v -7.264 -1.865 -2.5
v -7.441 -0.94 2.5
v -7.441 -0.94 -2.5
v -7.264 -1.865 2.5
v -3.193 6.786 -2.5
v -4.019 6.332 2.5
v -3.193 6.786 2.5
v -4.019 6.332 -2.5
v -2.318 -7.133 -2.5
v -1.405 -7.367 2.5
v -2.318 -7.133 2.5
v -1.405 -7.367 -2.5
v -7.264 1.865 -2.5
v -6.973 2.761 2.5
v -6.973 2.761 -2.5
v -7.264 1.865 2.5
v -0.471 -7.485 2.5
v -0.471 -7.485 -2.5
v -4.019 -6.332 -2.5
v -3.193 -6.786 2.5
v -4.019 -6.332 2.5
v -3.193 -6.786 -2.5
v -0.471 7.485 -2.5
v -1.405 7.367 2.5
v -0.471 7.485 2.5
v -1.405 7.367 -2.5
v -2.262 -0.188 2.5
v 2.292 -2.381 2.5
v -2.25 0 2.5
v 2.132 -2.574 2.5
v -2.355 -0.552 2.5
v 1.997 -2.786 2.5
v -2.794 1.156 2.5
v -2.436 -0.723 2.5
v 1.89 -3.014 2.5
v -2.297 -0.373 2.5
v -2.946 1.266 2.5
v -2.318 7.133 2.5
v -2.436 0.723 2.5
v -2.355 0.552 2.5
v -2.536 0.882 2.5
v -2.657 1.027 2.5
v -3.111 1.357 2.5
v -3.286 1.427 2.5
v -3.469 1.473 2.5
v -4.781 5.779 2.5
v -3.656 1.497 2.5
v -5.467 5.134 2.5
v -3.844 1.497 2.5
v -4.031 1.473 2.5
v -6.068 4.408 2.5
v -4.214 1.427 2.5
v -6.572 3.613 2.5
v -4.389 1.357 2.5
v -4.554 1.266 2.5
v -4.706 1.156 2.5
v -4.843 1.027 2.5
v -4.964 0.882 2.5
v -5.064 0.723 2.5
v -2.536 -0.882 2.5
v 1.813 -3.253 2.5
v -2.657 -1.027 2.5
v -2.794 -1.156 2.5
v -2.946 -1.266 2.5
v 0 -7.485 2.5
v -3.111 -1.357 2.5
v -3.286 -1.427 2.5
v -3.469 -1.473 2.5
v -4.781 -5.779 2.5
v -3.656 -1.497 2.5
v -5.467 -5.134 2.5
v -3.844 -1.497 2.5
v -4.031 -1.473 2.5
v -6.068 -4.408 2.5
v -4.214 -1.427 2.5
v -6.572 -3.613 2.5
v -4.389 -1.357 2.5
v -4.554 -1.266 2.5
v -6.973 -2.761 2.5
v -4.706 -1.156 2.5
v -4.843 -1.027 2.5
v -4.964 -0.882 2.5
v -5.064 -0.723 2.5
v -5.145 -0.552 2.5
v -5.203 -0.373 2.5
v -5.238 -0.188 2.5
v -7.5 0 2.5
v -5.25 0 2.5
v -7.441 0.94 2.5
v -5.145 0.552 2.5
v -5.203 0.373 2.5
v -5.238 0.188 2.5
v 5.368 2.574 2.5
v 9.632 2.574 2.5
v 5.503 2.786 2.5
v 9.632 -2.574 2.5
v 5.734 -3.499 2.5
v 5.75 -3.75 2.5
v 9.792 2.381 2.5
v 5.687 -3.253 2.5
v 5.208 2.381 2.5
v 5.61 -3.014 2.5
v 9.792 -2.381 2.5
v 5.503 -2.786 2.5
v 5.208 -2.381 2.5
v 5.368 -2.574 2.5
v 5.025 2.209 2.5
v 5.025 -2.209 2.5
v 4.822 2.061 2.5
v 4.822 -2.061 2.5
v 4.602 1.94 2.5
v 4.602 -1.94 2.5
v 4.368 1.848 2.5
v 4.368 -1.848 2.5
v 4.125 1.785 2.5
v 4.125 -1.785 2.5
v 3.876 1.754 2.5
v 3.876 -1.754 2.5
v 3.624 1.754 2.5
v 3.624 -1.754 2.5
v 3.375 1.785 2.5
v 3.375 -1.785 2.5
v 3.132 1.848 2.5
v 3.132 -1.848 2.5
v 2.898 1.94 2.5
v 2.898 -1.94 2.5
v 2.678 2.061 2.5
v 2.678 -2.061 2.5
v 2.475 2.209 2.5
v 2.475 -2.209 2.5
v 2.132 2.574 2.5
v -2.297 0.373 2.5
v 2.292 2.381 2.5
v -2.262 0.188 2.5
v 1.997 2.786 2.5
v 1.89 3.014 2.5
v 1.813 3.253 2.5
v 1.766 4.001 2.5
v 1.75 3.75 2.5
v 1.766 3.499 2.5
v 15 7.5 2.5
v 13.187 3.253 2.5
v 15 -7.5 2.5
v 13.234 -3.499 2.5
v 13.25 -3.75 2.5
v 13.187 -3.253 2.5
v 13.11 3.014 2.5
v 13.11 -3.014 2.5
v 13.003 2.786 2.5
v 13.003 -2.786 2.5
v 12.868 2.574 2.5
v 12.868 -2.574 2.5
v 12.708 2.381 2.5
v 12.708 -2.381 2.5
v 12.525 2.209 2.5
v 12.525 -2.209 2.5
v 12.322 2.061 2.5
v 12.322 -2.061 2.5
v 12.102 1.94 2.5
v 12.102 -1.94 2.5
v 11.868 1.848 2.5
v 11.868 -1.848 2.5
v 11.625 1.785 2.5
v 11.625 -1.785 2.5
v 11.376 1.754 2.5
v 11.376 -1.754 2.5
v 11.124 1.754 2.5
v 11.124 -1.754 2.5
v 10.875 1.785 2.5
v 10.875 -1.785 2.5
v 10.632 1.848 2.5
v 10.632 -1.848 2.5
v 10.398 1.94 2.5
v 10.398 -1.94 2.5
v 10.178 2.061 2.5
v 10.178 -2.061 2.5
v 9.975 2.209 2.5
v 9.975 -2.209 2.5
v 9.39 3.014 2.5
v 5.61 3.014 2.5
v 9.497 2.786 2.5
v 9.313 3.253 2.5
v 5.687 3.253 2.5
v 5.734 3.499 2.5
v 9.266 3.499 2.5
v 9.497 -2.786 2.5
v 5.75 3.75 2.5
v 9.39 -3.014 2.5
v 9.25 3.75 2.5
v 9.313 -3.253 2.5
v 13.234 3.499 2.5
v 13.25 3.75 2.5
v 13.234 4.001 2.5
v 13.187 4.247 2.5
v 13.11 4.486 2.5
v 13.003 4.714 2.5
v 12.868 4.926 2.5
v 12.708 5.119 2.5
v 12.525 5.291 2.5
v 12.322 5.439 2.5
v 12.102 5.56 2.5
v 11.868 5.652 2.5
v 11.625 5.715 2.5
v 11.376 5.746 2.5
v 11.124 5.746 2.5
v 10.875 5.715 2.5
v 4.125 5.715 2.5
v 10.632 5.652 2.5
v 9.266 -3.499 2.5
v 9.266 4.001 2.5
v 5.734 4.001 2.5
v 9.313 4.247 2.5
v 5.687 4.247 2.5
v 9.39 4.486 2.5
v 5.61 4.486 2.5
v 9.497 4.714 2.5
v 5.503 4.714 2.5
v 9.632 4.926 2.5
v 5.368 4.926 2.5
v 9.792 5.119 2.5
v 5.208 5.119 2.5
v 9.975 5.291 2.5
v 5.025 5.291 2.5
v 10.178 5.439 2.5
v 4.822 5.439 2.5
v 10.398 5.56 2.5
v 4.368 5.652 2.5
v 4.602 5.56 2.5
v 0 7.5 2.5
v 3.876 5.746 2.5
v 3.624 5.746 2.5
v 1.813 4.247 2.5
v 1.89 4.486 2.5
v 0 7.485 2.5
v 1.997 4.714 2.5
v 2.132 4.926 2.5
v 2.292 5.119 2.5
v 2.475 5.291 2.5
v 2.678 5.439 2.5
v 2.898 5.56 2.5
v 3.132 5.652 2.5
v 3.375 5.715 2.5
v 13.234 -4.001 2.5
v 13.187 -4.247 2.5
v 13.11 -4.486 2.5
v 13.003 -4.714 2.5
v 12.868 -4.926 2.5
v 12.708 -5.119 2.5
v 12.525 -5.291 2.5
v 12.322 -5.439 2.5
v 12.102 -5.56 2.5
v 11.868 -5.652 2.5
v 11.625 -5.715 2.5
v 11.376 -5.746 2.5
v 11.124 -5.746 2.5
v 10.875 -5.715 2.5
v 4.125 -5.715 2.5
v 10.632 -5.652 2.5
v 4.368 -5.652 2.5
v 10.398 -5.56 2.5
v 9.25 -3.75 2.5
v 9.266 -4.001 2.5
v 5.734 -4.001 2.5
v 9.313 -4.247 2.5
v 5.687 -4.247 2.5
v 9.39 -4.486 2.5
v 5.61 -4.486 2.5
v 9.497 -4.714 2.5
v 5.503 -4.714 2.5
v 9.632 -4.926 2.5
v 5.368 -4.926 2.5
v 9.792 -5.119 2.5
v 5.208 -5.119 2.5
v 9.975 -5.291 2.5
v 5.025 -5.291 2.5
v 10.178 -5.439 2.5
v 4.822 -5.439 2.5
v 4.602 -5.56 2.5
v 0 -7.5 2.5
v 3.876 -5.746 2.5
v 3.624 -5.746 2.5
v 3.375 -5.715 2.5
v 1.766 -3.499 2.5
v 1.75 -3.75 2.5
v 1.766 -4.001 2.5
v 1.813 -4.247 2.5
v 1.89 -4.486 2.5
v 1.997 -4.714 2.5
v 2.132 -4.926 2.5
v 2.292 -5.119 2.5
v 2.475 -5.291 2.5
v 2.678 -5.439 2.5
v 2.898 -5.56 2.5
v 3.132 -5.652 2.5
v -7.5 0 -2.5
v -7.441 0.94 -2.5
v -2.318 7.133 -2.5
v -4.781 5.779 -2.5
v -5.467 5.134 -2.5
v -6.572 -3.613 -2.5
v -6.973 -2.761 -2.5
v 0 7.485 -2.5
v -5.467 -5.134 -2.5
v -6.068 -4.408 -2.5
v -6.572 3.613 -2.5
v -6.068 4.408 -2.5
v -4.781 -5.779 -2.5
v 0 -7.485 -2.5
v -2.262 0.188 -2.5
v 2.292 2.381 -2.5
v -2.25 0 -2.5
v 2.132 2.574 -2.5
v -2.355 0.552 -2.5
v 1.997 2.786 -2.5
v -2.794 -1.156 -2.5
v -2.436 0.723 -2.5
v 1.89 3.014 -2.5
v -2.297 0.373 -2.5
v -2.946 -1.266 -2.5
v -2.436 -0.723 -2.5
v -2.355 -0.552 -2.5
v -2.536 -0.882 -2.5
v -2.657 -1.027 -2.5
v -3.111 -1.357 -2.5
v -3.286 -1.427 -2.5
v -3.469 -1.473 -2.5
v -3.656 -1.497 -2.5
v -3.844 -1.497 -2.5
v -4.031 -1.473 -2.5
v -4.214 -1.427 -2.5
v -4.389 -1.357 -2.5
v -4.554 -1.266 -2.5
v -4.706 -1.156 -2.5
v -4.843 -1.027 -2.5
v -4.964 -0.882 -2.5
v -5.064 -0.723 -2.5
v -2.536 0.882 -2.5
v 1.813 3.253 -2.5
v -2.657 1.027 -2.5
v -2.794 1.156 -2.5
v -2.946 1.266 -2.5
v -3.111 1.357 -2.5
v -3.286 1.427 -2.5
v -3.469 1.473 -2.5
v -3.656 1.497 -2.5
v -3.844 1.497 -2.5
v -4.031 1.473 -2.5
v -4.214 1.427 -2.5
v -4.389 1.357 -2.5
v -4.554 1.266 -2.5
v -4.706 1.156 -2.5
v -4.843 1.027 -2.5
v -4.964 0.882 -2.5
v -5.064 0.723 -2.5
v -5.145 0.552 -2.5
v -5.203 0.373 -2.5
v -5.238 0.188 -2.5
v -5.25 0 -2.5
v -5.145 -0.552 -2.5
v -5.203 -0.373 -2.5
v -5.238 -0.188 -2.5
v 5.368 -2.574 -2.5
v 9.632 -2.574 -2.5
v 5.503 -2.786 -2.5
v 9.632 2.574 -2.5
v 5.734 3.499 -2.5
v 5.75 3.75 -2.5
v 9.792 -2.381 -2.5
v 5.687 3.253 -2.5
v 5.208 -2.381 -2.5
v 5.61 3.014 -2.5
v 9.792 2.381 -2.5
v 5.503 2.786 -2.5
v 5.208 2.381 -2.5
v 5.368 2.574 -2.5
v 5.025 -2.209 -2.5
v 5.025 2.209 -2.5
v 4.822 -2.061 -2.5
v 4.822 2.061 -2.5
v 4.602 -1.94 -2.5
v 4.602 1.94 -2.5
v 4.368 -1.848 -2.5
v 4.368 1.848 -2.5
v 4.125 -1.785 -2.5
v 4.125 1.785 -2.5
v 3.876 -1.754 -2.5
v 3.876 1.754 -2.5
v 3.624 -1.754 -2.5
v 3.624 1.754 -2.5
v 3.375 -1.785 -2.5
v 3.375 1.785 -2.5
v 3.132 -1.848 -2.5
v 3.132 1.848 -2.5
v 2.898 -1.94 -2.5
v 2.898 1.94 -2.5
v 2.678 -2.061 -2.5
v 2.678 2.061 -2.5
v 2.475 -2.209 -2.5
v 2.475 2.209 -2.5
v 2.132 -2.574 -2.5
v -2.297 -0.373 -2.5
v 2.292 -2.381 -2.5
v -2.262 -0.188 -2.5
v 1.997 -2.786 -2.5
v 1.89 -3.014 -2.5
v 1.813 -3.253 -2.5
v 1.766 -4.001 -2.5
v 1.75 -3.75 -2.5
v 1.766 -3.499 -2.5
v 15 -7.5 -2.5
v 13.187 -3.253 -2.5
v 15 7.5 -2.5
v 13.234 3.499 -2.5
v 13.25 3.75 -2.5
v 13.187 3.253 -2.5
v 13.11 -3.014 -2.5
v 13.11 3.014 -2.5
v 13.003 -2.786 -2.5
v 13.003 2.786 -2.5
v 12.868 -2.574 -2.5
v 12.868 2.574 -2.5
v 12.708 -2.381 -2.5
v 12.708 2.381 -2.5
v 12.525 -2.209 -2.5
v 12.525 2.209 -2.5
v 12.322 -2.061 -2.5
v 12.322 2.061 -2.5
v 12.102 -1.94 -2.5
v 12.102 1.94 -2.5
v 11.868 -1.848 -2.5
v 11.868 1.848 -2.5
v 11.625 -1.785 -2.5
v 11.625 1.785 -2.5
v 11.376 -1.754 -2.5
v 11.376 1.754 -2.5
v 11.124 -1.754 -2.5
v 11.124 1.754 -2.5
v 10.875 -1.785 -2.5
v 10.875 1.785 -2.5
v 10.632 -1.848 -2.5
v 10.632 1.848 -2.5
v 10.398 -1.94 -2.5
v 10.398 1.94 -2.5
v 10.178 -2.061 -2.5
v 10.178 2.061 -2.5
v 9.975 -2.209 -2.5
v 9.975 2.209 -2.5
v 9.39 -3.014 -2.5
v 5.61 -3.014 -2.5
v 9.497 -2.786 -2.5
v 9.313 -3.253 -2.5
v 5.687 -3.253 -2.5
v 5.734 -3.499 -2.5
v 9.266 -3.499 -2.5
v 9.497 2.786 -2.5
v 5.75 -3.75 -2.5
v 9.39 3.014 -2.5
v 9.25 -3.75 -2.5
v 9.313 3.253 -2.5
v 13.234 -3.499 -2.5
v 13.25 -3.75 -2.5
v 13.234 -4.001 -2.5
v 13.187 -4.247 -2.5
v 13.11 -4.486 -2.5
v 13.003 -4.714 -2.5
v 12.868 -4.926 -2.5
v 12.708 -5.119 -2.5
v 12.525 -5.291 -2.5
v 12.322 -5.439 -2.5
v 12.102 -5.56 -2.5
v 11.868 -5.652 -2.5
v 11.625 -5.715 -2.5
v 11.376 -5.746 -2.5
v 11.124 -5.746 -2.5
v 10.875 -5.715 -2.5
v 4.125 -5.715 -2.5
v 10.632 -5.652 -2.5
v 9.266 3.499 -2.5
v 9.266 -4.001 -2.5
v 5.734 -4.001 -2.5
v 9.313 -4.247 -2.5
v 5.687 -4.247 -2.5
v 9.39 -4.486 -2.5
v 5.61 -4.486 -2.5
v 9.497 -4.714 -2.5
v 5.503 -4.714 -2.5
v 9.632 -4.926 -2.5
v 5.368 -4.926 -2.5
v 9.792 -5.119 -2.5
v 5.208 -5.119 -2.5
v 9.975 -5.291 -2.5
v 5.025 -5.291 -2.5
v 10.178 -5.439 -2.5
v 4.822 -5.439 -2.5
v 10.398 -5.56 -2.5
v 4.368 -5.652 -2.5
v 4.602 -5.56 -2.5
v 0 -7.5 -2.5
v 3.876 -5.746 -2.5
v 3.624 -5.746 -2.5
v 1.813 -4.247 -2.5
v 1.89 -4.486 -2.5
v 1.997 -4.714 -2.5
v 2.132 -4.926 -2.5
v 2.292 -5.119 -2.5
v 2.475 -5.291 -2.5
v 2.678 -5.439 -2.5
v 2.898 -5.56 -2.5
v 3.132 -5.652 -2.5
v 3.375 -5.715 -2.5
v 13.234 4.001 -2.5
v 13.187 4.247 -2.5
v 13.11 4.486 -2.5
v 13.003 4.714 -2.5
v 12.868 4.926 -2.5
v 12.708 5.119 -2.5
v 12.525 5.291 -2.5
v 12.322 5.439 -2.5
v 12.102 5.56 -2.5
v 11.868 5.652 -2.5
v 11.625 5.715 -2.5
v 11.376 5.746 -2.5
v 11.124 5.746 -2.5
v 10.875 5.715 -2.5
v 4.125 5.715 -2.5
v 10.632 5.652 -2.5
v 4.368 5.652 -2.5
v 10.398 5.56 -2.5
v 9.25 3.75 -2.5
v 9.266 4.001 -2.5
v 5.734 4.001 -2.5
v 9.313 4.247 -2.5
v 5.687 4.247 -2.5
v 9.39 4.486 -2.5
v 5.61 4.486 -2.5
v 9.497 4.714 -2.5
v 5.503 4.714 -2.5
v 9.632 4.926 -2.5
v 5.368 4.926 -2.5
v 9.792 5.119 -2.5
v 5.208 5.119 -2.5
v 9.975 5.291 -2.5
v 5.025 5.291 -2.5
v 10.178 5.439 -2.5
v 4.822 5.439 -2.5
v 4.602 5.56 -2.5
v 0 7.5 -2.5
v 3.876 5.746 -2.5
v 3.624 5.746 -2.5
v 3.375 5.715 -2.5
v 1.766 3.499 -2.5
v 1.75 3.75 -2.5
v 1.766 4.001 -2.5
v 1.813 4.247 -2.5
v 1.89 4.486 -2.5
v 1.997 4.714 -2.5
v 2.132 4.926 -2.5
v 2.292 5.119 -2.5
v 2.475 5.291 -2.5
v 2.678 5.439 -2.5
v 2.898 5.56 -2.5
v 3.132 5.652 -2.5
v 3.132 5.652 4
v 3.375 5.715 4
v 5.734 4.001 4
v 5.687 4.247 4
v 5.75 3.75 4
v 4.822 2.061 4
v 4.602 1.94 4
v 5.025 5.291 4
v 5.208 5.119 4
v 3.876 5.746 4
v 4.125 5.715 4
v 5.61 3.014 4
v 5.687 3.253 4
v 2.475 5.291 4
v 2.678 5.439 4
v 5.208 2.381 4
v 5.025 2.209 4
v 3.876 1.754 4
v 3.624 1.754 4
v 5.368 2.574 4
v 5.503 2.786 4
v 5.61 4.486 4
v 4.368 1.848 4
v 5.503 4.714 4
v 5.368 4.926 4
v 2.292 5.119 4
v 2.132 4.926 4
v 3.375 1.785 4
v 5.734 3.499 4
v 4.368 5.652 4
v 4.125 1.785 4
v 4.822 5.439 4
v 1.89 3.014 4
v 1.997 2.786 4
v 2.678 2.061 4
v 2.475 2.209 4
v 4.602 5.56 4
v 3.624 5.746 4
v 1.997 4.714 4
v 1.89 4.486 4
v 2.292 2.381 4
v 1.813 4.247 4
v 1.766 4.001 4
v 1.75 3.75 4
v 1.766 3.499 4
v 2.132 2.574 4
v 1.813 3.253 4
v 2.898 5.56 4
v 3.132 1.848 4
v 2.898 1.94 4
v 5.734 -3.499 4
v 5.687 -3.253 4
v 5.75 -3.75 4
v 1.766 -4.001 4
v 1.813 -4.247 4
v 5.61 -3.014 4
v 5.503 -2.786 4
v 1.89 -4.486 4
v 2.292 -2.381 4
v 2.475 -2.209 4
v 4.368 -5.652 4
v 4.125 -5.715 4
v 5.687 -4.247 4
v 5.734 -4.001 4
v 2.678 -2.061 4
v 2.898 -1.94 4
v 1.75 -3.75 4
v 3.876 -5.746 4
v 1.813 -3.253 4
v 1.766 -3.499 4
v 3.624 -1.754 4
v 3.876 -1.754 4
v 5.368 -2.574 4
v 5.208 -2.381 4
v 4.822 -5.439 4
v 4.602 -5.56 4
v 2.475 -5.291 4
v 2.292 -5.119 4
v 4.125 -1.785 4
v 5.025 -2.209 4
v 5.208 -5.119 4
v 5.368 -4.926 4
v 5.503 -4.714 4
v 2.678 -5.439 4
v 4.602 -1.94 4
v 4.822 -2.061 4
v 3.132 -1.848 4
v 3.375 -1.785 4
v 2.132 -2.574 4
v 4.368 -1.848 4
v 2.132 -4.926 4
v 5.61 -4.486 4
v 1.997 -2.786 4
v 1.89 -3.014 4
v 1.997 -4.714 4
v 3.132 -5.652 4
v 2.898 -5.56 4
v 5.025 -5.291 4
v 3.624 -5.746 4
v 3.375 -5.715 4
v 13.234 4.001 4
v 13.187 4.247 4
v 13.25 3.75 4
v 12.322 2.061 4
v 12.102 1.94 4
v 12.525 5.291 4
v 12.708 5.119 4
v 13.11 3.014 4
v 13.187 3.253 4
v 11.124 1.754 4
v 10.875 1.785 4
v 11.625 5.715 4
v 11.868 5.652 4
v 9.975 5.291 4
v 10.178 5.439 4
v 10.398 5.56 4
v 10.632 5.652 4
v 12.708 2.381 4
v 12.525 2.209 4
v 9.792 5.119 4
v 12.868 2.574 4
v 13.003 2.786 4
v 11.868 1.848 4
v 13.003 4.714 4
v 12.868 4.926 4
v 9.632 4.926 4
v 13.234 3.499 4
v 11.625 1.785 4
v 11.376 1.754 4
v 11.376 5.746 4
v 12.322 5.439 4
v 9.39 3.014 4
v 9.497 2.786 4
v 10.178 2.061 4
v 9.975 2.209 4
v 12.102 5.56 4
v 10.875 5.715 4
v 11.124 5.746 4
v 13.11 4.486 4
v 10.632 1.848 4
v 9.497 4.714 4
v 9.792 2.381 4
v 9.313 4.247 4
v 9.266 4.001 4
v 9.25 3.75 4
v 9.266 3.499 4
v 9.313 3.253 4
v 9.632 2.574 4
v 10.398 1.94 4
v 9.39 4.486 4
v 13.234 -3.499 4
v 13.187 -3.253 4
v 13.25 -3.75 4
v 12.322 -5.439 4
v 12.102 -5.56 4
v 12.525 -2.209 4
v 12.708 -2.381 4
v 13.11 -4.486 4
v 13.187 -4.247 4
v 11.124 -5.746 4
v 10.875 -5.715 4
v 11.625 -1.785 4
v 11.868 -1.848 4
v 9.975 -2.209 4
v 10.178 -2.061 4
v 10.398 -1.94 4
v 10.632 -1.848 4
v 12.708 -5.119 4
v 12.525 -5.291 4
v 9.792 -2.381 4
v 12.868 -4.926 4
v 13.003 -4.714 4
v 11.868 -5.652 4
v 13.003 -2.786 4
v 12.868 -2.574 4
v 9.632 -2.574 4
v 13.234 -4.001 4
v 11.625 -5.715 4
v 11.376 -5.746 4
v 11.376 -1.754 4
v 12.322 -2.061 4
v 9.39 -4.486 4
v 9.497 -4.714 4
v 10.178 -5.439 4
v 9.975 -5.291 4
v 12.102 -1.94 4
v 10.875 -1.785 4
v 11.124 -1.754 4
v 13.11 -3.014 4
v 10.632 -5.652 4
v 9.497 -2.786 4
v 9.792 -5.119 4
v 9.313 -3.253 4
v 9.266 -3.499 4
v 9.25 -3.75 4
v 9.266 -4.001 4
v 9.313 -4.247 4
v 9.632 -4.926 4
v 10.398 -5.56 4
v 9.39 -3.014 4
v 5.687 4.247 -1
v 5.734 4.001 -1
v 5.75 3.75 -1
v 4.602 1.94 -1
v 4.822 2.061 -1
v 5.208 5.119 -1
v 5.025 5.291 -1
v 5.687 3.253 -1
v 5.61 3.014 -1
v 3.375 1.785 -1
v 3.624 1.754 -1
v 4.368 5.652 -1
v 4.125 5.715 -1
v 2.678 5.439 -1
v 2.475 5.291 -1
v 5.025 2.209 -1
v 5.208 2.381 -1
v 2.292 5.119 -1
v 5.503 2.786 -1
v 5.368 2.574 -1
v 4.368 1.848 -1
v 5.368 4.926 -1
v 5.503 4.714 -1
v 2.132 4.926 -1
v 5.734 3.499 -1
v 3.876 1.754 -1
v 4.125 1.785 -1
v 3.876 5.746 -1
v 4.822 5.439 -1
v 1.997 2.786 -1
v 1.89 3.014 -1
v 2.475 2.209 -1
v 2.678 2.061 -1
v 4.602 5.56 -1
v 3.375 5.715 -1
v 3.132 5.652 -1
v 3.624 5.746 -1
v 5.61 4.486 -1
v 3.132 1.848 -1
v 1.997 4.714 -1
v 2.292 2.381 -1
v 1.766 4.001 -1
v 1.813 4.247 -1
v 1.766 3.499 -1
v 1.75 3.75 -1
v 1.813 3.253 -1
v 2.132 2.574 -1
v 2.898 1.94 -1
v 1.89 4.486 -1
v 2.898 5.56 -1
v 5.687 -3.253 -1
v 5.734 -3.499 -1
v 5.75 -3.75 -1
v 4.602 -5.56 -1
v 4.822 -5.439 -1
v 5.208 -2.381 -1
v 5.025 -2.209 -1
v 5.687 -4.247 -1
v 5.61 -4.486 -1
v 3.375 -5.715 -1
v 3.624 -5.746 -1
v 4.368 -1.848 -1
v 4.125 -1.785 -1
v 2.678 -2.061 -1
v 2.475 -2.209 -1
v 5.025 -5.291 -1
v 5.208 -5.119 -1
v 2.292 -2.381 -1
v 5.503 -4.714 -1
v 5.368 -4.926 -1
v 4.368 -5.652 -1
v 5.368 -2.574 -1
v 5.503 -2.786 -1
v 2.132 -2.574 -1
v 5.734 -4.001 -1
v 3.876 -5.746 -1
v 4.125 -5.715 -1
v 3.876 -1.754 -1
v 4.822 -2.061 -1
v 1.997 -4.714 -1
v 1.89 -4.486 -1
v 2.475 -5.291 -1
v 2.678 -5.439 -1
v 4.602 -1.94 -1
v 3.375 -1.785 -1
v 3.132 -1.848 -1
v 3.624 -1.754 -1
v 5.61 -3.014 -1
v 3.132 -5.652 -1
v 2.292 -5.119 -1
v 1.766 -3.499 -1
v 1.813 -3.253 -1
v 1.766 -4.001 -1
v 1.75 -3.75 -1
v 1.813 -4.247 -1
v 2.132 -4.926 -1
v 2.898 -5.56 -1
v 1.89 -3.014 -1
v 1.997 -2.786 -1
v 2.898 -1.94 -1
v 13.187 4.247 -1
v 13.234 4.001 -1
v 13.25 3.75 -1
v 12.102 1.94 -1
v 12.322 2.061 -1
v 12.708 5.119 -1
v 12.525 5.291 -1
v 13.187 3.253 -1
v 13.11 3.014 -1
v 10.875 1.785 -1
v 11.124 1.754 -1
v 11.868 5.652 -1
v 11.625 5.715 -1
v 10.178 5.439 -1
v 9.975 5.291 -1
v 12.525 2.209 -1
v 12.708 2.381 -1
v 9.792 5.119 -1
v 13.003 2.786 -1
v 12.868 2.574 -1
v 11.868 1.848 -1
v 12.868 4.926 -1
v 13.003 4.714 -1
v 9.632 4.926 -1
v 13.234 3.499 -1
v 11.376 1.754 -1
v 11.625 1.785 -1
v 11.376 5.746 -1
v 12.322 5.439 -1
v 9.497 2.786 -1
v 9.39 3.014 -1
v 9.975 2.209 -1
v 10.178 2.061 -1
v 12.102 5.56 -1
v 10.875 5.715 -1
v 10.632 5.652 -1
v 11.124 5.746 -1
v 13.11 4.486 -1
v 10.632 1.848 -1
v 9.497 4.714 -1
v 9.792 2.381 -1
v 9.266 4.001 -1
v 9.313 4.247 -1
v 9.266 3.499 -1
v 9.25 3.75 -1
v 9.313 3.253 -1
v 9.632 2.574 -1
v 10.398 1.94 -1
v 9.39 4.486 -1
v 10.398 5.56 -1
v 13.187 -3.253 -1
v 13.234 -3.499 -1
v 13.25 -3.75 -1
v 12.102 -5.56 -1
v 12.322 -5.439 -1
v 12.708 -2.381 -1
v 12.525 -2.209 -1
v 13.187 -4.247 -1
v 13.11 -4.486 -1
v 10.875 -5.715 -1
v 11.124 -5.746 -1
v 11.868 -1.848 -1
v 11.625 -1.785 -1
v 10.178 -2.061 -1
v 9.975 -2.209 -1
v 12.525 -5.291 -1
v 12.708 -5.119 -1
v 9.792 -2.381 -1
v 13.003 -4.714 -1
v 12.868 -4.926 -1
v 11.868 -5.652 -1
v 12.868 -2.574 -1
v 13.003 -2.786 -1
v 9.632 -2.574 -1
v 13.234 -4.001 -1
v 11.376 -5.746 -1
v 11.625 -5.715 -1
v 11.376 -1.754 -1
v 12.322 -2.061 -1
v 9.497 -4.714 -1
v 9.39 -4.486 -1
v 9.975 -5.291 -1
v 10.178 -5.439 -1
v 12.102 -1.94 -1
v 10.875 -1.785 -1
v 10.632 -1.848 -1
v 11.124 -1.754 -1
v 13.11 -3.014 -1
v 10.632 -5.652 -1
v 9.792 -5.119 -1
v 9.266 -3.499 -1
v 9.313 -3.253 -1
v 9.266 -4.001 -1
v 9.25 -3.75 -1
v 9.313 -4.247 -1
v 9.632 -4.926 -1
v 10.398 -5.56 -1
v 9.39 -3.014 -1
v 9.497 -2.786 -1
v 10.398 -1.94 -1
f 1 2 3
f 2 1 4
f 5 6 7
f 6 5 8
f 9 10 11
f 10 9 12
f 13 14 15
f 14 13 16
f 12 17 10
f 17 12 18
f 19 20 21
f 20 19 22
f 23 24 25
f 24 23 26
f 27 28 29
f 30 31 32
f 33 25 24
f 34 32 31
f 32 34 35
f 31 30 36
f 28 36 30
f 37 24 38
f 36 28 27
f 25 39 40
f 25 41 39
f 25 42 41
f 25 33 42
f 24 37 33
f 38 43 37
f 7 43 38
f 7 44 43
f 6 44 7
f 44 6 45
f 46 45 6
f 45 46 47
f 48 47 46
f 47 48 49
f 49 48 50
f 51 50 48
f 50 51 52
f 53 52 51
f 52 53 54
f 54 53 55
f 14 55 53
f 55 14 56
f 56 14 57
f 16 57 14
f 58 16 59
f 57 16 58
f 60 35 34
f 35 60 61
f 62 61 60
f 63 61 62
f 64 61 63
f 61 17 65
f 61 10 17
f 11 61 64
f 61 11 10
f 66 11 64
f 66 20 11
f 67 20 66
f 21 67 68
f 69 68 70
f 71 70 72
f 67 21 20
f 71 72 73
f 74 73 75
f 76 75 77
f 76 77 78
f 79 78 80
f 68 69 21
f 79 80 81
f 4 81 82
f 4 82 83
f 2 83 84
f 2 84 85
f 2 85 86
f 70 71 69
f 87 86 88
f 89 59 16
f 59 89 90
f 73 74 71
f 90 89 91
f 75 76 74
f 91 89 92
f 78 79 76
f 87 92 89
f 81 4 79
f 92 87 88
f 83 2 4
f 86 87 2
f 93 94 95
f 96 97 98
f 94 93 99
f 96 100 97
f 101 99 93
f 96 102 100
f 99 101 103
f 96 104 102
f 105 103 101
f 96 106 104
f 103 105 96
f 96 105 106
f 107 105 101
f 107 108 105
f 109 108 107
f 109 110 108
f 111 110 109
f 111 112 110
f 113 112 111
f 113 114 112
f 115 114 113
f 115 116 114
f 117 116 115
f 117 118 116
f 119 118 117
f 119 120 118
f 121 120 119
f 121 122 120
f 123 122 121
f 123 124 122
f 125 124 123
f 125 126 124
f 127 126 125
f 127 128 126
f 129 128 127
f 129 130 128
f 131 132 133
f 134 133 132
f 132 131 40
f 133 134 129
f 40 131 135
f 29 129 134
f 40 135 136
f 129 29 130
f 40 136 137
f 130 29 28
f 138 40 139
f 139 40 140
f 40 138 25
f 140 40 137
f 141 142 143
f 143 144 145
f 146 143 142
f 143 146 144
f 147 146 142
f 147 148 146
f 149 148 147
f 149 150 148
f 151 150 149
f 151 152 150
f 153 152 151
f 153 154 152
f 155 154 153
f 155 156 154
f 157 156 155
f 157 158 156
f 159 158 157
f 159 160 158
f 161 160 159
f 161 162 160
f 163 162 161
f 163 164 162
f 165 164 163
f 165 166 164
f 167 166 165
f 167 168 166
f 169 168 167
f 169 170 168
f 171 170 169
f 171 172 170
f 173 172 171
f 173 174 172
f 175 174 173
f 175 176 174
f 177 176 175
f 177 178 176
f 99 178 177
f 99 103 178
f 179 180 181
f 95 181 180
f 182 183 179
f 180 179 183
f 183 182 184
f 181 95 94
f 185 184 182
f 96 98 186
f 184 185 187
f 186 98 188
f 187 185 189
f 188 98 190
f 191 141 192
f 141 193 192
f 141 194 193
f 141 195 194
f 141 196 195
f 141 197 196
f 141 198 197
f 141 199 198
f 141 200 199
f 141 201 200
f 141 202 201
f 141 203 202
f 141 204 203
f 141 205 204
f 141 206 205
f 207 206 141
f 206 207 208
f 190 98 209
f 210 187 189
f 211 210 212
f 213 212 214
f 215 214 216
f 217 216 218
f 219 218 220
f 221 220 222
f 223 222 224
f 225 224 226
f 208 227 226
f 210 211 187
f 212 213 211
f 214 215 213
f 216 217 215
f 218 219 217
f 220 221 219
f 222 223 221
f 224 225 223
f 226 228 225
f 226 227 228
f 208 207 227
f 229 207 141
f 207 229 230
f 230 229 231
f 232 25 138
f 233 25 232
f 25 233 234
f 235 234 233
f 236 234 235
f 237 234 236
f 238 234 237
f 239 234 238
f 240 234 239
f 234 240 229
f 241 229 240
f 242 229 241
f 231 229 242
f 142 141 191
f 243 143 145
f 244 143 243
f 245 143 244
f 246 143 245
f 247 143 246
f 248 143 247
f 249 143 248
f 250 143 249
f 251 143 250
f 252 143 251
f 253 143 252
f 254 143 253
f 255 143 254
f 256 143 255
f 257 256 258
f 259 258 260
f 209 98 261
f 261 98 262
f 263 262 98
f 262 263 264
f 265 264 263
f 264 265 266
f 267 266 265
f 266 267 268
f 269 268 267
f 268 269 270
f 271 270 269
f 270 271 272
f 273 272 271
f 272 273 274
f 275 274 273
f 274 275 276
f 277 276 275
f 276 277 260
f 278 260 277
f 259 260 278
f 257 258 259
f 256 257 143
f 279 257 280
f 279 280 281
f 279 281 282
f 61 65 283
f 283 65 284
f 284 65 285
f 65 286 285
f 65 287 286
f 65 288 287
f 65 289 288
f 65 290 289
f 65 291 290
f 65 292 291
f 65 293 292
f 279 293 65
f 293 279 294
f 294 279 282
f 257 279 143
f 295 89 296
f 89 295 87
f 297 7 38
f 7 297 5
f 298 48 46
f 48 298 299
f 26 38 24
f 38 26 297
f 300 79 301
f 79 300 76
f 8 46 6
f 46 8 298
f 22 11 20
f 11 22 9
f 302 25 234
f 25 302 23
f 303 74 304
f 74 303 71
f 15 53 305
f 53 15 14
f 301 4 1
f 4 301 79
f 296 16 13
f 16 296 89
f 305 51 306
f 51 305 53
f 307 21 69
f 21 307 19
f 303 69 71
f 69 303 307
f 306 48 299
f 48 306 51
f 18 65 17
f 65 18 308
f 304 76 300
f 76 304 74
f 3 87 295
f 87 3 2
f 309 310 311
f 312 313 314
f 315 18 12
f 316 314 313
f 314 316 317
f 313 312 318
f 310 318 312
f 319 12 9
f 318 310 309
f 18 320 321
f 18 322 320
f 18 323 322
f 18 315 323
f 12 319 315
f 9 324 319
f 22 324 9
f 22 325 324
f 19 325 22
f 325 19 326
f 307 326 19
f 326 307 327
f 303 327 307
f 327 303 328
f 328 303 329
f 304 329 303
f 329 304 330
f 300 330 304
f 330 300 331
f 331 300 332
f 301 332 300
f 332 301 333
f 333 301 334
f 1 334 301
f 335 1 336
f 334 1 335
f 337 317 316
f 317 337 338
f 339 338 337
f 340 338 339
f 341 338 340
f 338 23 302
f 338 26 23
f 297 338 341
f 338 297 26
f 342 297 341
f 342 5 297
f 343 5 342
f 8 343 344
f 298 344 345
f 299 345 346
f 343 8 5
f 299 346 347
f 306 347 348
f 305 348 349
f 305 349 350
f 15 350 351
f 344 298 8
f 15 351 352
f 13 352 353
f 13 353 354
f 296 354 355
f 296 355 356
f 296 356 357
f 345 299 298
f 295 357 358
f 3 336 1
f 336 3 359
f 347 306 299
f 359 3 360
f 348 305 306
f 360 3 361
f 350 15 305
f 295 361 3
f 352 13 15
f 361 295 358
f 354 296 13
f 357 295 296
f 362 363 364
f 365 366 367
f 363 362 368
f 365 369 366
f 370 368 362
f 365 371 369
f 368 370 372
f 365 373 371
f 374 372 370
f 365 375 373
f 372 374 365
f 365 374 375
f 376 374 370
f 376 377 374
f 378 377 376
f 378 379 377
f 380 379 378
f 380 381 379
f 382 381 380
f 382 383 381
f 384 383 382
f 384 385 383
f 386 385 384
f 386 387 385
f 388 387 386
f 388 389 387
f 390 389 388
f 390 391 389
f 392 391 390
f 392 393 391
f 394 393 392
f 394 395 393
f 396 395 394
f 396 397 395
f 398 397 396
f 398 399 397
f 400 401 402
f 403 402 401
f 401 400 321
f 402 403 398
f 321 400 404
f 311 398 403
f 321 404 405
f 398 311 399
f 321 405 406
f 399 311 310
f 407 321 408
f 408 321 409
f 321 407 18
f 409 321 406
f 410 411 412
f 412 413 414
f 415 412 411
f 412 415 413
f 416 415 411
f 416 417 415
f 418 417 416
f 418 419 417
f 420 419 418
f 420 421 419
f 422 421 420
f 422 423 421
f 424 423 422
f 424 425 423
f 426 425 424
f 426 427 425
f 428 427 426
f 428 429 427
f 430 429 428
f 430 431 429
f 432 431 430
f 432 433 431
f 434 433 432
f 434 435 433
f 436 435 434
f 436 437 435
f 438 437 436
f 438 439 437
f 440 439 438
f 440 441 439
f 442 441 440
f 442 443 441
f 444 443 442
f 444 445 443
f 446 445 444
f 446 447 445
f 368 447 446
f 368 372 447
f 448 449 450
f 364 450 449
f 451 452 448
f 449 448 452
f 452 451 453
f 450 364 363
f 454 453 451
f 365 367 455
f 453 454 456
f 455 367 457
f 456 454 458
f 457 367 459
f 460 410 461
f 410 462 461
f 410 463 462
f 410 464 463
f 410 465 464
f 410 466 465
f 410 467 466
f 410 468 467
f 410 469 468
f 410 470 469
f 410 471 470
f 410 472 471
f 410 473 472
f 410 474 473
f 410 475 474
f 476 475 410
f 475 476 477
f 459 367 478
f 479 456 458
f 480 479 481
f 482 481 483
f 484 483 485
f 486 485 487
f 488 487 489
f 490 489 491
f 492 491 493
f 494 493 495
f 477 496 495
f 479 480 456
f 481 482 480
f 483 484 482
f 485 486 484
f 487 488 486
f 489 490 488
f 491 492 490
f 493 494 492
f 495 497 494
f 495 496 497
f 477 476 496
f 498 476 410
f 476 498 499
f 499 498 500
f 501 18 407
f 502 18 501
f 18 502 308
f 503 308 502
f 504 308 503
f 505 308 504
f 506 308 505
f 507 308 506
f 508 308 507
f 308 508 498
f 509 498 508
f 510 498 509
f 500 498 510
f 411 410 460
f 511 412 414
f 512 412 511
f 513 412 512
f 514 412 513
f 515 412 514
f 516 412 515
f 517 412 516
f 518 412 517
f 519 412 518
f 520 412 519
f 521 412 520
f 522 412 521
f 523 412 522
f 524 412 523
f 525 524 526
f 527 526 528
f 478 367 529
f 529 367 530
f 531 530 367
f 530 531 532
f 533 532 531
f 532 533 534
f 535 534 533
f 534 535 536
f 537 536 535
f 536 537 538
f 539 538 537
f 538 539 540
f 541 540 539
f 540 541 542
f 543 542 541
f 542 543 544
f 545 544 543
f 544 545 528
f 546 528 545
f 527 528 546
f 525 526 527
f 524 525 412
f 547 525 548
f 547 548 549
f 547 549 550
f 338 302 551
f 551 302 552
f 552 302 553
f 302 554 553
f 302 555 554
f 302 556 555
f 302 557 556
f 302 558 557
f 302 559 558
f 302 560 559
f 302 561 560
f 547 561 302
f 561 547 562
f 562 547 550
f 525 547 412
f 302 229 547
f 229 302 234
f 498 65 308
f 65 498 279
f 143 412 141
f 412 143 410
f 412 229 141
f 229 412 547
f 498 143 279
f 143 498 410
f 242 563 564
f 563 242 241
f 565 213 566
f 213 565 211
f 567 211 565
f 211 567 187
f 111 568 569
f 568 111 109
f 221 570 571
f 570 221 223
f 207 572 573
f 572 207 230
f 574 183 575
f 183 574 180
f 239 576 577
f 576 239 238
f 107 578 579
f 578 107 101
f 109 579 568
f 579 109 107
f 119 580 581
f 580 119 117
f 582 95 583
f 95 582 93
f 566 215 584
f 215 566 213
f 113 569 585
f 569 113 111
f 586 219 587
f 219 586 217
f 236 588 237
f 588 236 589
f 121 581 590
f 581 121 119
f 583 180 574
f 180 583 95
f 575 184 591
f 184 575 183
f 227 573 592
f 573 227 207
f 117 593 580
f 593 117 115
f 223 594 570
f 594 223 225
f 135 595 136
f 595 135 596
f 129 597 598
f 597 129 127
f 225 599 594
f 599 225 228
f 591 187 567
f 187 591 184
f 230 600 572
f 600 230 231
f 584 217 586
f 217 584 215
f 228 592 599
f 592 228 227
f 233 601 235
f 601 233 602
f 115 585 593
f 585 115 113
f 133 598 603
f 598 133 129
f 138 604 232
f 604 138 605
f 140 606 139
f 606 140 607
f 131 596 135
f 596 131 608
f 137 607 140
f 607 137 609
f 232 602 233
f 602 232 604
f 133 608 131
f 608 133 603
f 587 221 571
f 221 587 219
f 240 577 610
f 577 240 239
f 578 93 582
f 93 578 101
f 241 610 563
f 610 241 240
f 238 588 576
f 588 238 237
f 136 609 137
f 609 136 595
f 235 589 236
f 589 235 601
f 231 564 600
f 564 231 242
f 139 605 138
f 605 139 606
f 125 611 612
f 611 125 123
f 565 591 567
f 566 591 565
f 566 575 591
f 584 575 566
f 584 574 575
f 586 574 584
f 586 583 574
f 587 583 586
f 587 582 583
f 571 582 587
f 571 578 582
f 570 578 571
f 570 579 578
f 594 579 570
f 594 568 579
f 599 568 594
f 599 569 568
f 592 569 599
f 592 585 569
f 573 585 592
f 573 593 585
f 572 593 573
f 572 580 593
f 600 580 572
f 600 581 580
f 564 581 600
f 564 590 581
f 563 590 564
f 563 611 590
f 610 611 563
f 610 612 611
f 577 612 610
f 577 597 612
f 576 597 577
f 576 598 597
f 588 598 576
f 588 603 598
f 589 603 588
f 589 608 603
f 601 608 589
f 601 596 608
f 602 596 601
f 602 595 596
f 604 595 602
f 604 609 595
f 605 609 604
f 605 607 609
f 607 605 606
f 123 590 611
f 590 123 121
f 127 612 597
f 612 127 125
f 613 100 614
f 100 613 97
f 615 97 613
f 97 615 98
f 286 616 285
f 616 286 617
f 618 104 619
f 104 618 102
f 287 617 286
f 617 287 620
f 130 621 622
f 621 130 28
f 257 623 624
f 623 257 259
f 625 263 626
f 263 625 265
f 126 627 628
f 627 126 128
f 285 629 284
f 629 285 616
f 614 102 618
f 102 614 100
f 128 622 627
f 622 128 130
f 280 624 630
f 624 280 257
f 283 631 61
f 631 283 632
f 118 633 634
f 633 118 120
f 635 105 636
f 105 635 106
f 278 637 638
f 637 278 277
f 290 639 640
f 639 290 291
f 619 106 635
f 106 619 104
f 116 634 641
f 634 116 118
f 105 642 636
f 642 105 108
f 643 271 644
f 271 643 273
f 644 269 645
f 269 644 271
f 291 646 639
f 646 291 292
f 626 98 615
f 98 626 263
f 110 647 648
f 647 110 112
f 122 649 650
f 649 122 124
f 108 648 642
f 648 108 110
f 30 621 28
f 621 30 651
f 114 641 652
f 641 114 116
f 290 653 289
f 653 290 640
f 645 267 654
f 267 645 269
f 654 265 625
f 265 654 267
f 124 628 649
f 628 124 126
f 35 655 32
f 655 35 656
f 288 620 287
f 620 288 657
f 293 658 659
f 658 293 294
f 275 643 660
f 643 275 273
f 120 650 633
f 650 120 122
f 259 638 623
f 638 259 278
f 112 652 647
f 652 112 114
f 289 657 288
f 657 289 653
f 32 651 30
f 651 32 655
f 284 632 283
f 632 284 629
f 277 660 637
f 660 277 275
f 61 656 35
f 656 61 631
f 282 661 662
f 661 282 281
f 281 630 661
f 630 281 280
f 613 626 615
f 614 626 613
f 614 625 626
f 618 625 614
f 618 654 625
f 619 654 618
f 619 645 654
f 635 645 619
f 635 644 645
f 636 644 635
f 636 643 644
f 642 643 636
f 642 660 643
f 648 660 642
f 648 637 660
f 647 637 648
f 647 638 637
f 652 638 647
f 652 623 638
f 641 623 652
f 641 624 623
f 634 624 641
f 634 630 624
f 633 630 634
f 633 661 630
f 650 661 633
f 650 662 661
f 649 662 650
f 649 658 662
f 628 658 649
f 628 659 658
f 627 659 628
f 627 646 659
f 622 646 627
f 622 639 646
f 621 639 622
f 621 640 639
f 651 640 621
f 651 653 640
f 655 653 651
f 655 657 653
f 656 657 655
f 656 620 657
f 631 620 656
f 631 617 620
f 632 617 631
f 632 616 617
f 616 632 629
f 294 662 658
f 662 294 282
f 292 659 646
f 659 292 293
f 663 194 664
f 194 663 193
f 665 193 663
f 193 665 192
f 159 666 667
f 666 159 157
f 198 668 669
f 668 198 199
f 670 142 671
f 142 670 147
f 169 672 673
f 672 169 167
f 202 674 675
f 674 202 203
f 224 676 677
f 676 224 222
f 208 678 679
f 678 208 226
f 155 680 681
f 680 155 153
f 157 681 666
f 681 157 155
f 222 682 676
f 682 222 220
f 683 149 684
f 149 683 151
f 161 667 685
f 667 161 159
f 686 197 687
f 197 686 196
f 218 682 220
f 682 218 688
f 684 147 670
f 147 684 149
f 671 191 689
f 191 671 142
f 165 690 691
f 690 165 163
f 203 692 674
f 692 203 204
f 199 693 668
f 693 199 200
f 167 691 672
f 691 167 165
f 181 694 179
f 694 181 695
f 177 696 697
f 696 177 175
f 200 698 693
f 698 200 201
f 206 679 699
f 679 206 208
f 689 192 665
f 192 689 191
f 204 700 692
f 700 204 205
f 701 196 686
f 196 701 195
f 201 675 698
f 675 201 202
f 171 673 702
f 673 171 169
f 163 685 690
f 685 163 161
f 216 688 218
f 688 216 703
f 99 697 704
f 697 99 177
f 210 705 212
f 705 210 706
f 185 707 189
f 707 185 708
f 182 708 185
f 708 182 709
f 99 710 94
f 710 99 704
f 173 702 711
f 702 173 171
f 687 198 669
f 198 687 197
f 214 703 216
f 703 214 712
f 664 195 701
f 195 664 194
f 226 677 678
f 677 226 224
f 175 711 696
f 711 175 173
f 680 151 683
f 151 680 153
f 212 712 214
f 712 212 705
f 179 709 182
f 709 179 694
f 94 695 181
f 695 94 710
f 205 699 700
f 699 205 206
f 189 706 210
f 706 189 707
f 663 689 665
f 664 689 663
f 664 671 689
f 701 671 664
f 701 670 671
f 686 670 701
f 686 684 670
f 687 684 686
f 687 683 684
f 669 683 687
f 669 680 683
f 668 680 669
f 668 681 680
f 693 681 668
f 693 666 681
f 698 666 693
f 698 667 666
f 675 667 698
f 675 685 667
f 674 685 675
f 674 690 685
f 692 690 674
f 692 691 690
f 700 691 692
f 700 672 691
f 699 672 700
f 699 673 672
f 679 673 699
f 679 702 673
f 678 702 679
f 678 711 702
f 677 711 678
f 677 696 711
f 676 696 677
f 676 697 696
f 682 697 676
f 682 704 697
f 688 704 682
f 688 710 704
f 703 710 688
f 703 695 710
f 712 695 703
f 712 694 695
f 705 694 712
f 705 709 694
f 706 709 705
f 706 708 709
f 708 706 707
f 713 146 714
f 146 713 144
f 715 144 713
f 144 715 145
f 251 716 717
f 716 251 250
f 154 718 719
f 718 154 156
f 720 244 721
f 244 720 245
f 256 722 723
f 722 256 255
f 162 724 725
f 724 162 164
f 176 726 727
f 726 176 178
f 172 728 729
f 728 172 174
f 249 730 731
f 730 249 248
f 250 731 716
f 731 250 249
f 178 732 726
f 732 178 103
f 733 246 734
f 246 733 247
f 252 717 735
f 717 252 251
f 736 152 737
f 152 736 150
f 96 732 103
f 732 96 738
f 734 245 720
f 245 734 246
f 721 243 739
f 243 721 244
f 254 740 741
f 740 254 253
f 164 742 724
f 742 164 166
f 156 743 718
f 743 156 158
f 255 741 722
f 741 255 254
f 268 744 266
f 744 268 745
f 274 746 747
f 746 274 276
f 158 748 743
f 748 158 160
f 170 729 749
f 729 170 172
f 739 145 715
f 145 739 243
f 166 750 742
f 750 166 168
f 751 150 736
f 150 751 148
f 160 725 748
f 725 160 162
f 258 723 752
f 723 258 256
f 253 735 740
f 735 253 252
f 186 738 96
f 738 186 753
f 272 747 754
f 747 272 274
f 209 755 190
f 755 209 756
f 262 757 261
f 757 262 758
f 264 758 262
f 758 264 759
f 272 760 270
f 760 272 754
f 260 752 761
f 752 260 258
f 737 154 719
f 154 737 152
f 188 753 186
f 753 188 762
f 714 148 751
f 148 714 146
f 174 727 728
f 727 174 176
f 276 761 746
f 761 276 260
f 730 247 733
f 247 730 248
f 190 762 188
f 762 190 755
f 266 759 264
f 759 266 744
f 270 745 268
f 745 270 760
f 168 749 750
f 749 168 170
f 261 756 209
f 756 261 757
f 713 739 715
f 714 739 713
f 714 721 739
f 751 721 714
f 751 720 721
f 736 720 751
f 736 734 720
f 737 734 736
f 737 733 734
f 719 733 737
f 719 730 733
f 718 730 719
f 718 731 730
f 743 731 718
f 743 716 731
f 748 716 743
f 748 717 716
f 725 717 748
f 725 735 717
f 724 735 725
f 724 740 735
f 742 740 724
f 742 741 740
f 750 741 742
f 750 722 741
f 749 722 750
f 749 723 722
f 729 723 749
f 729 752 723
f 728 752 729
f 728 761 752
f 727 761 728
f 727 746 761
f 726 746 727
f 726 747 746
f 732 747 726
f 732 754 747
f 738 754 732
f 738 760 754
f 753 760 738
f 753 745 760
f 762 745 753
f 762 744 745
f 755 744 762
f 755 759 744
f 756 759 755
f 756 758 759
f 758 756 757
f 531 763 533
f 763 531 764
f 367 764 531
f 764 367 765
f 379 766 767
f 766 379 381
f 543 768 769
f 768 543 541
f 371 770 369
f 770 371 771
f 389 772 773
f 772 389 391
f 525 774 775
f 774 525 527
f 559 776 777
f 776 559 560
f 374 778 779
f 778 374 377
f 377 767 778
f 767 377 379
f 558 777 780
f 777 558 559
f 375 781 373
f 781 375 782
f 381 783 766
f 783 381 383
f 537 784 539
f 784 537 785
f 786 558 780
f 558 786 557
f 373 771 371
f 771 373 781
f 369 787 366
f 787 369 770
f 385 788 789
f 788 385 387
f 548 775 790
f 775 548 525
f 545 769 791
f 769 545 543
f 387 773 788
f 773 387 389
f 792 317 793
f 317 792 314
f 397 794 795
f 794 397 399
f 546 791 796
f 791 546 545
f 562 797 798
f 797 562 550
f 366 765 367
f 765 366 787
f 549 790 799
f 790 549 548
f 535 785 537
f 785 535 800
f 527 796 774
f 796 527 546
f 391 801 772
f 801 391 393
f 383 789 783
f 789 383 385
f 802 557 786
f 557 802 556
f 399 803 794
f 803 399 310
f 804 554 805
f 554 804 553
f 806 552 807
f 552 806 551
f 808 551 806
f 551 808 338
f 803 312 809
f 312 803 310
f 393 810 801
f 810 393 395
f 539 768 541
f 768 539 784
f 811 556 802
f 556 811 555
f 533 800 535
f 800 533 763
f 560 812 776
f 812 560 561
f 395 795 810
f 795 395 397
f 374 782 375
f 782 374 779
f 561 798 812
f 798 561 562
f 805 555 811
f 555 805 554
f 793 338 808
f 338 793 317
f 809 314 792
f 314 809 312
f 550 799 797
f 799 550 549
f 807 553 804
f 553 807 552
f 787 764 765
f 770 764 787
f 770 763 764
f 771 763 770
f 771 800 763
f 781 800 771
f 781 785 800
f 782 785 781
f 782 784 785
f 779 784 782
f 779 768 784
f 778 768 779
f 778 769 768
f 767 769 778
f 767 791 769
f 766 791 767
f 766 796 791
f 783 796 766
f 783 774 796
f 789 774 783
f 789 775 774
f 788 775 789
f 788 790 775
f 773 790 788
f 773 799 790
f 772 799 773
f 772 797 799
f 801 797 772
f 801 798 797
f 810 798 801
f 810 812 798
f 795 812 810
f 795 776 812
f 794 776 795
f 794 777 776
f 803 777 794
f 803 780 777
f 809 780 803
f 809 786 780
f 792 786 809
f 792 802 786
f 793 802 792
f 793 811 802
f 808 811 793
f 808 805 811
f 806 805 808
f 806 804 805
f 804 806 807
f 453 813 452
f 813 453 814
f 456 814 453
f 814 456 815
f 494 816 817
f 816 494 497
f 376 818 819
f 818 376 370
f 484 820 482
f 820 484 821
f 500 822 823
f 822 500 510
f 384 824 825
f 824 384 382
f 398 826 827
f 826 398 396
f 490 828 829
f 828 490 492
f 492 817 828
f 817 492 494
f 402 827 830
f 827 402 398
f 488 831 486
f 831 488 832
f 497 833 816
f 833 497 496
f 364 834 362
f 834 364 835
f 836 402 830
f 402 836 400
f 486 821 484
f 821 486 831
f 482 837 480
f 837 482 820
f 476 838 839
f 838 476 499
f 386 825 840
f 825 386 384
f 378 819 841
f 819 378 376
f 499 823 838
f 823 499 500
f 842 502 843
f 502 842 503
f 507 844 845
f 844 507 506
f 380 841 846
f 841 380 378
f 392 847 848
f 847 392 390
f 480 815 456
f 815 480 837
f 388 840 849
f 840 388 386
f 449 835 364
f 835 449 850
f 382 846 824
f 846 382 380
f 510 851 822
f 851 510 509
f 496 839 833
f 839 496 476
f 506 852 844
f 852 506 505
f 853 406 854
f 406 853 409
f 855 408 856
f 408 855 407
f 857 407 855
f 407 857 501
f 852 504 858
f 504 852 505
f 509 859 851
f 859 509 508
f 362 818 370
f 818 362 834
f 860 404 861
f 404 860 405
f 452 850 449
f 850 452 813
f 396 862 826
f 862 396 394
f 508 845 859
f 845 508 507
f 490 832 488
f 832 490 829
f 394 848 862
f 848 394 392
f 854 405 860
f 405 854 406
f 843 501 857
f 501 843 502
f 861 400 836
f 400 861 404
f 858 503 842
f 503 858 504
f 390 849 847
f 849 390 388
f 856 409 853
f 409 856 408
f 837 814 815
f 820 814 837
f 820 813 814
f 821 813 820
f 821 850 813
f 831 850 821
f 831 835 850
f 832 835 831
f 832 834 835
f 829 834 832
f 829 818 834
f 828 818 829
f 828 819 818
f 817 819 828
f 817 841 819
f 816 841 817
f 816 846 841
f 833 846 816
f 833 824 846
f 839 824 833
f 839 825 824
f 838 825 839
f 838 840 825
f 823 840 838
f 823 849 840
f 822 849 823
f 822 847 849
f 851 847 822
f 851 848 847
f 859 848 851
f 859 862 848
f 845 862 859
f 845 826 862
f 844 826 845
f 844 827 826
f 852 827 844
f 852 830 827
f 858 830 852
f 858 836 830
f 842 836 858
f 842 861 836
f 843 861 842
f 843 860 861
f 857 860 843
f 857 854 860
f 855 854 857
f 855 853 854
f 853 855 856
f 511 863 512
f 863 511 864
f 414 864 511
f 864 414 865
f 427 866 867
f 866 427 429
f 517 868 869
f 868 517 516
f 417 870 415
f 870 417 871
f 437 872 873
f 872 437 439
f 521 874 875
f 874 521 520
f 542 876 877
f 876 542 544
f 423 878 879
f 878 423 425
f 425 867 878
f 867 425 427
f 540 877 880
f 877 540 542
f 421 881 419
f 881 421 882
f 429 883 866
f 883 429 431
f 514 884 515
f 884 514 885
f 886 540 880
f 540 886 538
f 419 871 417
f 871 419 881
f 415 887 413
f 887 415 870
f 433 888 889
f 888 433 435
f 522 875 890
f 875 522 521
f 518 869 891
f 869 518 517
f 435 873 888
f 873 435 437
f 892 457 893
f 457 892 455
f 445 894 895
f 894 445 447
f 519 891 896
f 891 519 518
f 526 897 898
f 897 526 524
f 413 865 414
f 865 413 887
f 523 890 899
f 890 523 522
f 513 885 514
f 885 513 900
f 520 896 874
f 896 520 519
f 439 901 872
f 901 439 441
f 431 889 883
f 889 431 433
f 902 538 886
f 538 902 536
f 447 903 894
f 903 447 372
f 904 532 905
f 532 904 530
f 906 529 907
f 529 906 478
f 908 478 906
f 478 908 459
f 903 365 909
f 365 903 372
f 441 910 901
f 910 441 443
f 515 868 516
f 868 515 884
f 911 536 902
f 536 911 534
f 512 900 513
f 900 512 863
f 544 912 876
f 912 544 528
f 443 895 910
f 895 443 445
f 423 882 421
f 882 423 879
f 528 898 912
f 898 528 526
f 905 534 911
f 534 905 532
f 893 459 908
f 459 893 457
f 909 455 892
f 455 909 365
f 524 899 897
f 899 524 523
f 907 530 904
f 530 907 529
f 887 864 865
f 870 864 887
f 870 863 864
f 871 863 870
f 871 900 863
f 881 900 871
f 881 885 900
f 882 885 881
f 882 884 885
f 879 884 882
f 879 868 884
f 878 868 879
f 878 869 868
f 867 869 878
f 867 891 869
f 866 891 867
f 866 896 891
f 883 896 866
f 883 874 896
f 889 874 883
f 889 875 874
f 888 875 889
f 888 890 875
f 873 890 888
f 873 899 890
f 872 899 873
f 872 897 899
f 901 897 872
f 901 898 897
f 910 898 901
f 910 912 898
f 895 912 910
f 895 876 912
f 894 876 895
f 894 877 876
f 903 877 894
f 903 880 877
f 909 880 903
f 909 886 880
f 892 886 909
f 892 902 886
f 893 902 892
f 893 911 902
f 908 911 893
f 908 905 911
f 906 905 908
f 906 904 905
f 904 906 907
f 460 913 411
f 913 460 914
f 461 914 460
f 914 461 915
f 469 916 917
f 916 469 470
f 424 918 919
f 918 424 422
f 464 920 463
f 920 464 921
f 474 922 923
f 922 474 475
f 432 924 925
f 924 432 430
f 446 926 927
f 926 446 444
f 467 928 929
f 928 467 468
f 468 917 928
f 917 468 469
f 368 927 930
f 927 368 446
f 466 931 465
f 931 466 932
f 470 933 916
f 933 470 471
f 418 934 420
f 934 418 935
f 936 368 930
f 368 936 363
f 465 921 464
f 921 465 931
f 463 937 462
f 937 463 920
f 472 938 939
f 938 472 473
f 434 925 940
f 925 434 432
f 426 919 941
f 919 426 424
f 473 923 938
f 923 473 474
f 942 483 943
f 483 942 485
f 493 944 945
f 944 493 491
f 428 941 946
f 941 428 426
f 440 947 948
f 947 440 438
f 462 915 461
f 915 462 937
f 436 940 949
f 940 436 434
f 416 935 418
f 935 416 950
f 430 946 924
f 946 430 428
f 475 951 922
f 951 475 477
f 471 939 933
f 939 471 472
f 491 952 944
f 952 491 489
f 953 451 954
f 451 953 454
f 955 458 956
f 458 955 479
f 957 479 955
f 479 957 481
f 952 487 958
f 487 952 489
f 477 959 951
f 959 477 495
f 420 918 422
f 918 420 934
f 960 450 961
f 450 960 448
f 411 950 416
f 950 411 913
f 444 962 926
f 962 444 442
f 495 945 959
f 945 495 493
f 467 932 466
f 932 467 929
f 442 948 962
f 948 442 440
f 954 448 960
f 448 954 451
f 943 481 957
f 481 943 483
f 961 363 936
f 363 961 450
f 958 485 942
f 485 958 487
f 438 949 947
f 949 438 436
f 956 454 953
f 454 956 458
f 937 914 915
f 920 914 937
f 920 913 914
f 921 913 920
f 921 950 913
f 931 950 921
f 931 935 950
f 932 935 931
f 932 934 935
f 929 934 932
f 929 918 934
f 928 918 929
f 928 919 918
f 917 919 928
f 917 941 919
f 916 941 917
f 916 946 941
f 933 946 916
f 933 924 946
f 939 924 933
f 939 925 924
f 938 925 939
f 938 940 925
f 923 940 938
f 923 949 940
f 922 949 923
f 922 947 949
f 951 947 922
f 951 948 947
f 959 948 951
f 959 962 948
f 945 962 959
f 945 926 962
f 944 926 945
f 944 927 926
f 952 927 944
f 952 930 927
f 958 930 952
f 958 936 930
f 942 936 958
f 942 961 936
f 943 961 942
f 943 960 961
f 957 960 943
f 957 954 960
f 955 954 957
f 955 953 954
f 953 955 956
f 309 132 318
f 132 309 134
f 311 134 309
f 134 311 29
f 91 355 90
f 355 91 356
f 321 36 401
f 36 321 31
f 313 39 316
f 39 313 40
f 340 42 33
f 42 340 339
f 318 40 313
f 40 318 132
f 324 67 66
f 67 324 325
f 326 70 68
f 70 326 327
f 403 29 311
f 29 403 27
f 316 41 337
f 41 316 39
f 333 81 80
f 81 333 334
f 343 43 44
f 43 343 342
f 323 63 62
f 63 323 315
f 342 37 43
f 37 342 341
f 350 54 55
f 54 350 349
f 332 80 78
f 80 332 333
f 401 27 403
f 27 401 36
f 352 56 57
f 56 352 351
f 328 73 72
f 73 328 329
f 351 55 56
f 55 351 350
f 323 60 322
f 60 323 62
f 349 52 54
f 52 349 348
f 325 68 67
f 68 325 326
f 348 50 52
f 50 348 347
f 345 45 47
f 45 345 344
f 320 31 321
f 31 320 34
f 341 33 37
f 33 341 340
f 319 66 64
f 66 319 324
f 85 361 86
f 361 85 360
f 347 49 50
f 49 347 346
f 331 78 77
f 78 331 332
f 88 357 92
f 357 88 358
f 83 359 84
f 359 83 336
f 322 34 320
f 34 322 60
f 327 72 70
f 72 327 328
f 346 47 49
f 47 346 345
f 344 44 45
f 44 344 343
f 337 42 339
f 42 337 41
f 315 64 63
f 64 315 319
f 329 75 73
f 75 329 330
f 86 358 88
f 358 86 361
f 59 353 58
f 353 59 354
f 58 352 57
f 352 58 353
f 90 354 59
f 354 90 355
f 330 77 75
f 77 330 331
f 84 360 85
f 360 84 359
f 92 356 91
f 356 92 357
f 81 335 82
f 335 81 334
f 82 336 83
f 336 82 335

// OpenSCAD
//Size on the y-Axis in mm
size = 15;

//Size on the z-Axis in mm
height = 5;

module half(){
	difference(){
		cylinder(r=size/2,h=height,$fn=50, center=true);
		translate([(size+1)/2,0,0]) cube([size + 1, size + 1,height + 1],center = true);
	}
}

module plate(){
	union() {
		half();
		translate([0,-size/2,-height/2]) cube([size,size,height]);
	}
}

//Top Knob Diameter
knob_diameter = 4;

//Top Knob Hight
knob_hight = 1.5;

//Bottom Hole Diameter
hole_diameter = 4;

//Bottom Hole Depth
hole_depth = 1.5;

//Keyring Hole Diameter
keyring_hole=1.5;

difference(){
	union(){
		plate();
		translate([size/4, size/4 , height/2]) cylinder(r=knob_diameter/2,h=knob_hight,$fn=50);
		translate([size/4, -size/4, height/2]) cylinder(r=knob_diameter/2,h=knob_hight,$fn=50);
		translate([3*(size/4), size/4, height/2]) cylinder(r=knob_diameter/2,h=knob_hight,$fn=50);
		translate([3*(size/4),-size/4, height/2]) cylinder(r=knob_diameter/2,h=knob_hight,$fn=50);
	}
	translate([size/4,size/4,-height/2-0.01]) cylinder(r=hole_diameter/2,h=hole_depth+0.01,$fn=50);
	translate([size/4,-size/4,-height/2-0.01]) cylinder(r=hole_diameter/2,h=hole_depth+0.01,$fn=50);
	translate([3*(size/4),size/4,-height/2-0.01]) cylinder(r=hole_diameter/2,h=hole_depth+0.01,$fn=50);
	translate([3*(size/4),-size/4,-height/2-0.01]) cylinder(r=hole_diameter/2,h=hole_depth+0.01,$fn=50);
	translate([-size/4,0,-height/2-0.01]) cylinder(r=keyring_hole, h=height+0.02, $fn=50);
}
